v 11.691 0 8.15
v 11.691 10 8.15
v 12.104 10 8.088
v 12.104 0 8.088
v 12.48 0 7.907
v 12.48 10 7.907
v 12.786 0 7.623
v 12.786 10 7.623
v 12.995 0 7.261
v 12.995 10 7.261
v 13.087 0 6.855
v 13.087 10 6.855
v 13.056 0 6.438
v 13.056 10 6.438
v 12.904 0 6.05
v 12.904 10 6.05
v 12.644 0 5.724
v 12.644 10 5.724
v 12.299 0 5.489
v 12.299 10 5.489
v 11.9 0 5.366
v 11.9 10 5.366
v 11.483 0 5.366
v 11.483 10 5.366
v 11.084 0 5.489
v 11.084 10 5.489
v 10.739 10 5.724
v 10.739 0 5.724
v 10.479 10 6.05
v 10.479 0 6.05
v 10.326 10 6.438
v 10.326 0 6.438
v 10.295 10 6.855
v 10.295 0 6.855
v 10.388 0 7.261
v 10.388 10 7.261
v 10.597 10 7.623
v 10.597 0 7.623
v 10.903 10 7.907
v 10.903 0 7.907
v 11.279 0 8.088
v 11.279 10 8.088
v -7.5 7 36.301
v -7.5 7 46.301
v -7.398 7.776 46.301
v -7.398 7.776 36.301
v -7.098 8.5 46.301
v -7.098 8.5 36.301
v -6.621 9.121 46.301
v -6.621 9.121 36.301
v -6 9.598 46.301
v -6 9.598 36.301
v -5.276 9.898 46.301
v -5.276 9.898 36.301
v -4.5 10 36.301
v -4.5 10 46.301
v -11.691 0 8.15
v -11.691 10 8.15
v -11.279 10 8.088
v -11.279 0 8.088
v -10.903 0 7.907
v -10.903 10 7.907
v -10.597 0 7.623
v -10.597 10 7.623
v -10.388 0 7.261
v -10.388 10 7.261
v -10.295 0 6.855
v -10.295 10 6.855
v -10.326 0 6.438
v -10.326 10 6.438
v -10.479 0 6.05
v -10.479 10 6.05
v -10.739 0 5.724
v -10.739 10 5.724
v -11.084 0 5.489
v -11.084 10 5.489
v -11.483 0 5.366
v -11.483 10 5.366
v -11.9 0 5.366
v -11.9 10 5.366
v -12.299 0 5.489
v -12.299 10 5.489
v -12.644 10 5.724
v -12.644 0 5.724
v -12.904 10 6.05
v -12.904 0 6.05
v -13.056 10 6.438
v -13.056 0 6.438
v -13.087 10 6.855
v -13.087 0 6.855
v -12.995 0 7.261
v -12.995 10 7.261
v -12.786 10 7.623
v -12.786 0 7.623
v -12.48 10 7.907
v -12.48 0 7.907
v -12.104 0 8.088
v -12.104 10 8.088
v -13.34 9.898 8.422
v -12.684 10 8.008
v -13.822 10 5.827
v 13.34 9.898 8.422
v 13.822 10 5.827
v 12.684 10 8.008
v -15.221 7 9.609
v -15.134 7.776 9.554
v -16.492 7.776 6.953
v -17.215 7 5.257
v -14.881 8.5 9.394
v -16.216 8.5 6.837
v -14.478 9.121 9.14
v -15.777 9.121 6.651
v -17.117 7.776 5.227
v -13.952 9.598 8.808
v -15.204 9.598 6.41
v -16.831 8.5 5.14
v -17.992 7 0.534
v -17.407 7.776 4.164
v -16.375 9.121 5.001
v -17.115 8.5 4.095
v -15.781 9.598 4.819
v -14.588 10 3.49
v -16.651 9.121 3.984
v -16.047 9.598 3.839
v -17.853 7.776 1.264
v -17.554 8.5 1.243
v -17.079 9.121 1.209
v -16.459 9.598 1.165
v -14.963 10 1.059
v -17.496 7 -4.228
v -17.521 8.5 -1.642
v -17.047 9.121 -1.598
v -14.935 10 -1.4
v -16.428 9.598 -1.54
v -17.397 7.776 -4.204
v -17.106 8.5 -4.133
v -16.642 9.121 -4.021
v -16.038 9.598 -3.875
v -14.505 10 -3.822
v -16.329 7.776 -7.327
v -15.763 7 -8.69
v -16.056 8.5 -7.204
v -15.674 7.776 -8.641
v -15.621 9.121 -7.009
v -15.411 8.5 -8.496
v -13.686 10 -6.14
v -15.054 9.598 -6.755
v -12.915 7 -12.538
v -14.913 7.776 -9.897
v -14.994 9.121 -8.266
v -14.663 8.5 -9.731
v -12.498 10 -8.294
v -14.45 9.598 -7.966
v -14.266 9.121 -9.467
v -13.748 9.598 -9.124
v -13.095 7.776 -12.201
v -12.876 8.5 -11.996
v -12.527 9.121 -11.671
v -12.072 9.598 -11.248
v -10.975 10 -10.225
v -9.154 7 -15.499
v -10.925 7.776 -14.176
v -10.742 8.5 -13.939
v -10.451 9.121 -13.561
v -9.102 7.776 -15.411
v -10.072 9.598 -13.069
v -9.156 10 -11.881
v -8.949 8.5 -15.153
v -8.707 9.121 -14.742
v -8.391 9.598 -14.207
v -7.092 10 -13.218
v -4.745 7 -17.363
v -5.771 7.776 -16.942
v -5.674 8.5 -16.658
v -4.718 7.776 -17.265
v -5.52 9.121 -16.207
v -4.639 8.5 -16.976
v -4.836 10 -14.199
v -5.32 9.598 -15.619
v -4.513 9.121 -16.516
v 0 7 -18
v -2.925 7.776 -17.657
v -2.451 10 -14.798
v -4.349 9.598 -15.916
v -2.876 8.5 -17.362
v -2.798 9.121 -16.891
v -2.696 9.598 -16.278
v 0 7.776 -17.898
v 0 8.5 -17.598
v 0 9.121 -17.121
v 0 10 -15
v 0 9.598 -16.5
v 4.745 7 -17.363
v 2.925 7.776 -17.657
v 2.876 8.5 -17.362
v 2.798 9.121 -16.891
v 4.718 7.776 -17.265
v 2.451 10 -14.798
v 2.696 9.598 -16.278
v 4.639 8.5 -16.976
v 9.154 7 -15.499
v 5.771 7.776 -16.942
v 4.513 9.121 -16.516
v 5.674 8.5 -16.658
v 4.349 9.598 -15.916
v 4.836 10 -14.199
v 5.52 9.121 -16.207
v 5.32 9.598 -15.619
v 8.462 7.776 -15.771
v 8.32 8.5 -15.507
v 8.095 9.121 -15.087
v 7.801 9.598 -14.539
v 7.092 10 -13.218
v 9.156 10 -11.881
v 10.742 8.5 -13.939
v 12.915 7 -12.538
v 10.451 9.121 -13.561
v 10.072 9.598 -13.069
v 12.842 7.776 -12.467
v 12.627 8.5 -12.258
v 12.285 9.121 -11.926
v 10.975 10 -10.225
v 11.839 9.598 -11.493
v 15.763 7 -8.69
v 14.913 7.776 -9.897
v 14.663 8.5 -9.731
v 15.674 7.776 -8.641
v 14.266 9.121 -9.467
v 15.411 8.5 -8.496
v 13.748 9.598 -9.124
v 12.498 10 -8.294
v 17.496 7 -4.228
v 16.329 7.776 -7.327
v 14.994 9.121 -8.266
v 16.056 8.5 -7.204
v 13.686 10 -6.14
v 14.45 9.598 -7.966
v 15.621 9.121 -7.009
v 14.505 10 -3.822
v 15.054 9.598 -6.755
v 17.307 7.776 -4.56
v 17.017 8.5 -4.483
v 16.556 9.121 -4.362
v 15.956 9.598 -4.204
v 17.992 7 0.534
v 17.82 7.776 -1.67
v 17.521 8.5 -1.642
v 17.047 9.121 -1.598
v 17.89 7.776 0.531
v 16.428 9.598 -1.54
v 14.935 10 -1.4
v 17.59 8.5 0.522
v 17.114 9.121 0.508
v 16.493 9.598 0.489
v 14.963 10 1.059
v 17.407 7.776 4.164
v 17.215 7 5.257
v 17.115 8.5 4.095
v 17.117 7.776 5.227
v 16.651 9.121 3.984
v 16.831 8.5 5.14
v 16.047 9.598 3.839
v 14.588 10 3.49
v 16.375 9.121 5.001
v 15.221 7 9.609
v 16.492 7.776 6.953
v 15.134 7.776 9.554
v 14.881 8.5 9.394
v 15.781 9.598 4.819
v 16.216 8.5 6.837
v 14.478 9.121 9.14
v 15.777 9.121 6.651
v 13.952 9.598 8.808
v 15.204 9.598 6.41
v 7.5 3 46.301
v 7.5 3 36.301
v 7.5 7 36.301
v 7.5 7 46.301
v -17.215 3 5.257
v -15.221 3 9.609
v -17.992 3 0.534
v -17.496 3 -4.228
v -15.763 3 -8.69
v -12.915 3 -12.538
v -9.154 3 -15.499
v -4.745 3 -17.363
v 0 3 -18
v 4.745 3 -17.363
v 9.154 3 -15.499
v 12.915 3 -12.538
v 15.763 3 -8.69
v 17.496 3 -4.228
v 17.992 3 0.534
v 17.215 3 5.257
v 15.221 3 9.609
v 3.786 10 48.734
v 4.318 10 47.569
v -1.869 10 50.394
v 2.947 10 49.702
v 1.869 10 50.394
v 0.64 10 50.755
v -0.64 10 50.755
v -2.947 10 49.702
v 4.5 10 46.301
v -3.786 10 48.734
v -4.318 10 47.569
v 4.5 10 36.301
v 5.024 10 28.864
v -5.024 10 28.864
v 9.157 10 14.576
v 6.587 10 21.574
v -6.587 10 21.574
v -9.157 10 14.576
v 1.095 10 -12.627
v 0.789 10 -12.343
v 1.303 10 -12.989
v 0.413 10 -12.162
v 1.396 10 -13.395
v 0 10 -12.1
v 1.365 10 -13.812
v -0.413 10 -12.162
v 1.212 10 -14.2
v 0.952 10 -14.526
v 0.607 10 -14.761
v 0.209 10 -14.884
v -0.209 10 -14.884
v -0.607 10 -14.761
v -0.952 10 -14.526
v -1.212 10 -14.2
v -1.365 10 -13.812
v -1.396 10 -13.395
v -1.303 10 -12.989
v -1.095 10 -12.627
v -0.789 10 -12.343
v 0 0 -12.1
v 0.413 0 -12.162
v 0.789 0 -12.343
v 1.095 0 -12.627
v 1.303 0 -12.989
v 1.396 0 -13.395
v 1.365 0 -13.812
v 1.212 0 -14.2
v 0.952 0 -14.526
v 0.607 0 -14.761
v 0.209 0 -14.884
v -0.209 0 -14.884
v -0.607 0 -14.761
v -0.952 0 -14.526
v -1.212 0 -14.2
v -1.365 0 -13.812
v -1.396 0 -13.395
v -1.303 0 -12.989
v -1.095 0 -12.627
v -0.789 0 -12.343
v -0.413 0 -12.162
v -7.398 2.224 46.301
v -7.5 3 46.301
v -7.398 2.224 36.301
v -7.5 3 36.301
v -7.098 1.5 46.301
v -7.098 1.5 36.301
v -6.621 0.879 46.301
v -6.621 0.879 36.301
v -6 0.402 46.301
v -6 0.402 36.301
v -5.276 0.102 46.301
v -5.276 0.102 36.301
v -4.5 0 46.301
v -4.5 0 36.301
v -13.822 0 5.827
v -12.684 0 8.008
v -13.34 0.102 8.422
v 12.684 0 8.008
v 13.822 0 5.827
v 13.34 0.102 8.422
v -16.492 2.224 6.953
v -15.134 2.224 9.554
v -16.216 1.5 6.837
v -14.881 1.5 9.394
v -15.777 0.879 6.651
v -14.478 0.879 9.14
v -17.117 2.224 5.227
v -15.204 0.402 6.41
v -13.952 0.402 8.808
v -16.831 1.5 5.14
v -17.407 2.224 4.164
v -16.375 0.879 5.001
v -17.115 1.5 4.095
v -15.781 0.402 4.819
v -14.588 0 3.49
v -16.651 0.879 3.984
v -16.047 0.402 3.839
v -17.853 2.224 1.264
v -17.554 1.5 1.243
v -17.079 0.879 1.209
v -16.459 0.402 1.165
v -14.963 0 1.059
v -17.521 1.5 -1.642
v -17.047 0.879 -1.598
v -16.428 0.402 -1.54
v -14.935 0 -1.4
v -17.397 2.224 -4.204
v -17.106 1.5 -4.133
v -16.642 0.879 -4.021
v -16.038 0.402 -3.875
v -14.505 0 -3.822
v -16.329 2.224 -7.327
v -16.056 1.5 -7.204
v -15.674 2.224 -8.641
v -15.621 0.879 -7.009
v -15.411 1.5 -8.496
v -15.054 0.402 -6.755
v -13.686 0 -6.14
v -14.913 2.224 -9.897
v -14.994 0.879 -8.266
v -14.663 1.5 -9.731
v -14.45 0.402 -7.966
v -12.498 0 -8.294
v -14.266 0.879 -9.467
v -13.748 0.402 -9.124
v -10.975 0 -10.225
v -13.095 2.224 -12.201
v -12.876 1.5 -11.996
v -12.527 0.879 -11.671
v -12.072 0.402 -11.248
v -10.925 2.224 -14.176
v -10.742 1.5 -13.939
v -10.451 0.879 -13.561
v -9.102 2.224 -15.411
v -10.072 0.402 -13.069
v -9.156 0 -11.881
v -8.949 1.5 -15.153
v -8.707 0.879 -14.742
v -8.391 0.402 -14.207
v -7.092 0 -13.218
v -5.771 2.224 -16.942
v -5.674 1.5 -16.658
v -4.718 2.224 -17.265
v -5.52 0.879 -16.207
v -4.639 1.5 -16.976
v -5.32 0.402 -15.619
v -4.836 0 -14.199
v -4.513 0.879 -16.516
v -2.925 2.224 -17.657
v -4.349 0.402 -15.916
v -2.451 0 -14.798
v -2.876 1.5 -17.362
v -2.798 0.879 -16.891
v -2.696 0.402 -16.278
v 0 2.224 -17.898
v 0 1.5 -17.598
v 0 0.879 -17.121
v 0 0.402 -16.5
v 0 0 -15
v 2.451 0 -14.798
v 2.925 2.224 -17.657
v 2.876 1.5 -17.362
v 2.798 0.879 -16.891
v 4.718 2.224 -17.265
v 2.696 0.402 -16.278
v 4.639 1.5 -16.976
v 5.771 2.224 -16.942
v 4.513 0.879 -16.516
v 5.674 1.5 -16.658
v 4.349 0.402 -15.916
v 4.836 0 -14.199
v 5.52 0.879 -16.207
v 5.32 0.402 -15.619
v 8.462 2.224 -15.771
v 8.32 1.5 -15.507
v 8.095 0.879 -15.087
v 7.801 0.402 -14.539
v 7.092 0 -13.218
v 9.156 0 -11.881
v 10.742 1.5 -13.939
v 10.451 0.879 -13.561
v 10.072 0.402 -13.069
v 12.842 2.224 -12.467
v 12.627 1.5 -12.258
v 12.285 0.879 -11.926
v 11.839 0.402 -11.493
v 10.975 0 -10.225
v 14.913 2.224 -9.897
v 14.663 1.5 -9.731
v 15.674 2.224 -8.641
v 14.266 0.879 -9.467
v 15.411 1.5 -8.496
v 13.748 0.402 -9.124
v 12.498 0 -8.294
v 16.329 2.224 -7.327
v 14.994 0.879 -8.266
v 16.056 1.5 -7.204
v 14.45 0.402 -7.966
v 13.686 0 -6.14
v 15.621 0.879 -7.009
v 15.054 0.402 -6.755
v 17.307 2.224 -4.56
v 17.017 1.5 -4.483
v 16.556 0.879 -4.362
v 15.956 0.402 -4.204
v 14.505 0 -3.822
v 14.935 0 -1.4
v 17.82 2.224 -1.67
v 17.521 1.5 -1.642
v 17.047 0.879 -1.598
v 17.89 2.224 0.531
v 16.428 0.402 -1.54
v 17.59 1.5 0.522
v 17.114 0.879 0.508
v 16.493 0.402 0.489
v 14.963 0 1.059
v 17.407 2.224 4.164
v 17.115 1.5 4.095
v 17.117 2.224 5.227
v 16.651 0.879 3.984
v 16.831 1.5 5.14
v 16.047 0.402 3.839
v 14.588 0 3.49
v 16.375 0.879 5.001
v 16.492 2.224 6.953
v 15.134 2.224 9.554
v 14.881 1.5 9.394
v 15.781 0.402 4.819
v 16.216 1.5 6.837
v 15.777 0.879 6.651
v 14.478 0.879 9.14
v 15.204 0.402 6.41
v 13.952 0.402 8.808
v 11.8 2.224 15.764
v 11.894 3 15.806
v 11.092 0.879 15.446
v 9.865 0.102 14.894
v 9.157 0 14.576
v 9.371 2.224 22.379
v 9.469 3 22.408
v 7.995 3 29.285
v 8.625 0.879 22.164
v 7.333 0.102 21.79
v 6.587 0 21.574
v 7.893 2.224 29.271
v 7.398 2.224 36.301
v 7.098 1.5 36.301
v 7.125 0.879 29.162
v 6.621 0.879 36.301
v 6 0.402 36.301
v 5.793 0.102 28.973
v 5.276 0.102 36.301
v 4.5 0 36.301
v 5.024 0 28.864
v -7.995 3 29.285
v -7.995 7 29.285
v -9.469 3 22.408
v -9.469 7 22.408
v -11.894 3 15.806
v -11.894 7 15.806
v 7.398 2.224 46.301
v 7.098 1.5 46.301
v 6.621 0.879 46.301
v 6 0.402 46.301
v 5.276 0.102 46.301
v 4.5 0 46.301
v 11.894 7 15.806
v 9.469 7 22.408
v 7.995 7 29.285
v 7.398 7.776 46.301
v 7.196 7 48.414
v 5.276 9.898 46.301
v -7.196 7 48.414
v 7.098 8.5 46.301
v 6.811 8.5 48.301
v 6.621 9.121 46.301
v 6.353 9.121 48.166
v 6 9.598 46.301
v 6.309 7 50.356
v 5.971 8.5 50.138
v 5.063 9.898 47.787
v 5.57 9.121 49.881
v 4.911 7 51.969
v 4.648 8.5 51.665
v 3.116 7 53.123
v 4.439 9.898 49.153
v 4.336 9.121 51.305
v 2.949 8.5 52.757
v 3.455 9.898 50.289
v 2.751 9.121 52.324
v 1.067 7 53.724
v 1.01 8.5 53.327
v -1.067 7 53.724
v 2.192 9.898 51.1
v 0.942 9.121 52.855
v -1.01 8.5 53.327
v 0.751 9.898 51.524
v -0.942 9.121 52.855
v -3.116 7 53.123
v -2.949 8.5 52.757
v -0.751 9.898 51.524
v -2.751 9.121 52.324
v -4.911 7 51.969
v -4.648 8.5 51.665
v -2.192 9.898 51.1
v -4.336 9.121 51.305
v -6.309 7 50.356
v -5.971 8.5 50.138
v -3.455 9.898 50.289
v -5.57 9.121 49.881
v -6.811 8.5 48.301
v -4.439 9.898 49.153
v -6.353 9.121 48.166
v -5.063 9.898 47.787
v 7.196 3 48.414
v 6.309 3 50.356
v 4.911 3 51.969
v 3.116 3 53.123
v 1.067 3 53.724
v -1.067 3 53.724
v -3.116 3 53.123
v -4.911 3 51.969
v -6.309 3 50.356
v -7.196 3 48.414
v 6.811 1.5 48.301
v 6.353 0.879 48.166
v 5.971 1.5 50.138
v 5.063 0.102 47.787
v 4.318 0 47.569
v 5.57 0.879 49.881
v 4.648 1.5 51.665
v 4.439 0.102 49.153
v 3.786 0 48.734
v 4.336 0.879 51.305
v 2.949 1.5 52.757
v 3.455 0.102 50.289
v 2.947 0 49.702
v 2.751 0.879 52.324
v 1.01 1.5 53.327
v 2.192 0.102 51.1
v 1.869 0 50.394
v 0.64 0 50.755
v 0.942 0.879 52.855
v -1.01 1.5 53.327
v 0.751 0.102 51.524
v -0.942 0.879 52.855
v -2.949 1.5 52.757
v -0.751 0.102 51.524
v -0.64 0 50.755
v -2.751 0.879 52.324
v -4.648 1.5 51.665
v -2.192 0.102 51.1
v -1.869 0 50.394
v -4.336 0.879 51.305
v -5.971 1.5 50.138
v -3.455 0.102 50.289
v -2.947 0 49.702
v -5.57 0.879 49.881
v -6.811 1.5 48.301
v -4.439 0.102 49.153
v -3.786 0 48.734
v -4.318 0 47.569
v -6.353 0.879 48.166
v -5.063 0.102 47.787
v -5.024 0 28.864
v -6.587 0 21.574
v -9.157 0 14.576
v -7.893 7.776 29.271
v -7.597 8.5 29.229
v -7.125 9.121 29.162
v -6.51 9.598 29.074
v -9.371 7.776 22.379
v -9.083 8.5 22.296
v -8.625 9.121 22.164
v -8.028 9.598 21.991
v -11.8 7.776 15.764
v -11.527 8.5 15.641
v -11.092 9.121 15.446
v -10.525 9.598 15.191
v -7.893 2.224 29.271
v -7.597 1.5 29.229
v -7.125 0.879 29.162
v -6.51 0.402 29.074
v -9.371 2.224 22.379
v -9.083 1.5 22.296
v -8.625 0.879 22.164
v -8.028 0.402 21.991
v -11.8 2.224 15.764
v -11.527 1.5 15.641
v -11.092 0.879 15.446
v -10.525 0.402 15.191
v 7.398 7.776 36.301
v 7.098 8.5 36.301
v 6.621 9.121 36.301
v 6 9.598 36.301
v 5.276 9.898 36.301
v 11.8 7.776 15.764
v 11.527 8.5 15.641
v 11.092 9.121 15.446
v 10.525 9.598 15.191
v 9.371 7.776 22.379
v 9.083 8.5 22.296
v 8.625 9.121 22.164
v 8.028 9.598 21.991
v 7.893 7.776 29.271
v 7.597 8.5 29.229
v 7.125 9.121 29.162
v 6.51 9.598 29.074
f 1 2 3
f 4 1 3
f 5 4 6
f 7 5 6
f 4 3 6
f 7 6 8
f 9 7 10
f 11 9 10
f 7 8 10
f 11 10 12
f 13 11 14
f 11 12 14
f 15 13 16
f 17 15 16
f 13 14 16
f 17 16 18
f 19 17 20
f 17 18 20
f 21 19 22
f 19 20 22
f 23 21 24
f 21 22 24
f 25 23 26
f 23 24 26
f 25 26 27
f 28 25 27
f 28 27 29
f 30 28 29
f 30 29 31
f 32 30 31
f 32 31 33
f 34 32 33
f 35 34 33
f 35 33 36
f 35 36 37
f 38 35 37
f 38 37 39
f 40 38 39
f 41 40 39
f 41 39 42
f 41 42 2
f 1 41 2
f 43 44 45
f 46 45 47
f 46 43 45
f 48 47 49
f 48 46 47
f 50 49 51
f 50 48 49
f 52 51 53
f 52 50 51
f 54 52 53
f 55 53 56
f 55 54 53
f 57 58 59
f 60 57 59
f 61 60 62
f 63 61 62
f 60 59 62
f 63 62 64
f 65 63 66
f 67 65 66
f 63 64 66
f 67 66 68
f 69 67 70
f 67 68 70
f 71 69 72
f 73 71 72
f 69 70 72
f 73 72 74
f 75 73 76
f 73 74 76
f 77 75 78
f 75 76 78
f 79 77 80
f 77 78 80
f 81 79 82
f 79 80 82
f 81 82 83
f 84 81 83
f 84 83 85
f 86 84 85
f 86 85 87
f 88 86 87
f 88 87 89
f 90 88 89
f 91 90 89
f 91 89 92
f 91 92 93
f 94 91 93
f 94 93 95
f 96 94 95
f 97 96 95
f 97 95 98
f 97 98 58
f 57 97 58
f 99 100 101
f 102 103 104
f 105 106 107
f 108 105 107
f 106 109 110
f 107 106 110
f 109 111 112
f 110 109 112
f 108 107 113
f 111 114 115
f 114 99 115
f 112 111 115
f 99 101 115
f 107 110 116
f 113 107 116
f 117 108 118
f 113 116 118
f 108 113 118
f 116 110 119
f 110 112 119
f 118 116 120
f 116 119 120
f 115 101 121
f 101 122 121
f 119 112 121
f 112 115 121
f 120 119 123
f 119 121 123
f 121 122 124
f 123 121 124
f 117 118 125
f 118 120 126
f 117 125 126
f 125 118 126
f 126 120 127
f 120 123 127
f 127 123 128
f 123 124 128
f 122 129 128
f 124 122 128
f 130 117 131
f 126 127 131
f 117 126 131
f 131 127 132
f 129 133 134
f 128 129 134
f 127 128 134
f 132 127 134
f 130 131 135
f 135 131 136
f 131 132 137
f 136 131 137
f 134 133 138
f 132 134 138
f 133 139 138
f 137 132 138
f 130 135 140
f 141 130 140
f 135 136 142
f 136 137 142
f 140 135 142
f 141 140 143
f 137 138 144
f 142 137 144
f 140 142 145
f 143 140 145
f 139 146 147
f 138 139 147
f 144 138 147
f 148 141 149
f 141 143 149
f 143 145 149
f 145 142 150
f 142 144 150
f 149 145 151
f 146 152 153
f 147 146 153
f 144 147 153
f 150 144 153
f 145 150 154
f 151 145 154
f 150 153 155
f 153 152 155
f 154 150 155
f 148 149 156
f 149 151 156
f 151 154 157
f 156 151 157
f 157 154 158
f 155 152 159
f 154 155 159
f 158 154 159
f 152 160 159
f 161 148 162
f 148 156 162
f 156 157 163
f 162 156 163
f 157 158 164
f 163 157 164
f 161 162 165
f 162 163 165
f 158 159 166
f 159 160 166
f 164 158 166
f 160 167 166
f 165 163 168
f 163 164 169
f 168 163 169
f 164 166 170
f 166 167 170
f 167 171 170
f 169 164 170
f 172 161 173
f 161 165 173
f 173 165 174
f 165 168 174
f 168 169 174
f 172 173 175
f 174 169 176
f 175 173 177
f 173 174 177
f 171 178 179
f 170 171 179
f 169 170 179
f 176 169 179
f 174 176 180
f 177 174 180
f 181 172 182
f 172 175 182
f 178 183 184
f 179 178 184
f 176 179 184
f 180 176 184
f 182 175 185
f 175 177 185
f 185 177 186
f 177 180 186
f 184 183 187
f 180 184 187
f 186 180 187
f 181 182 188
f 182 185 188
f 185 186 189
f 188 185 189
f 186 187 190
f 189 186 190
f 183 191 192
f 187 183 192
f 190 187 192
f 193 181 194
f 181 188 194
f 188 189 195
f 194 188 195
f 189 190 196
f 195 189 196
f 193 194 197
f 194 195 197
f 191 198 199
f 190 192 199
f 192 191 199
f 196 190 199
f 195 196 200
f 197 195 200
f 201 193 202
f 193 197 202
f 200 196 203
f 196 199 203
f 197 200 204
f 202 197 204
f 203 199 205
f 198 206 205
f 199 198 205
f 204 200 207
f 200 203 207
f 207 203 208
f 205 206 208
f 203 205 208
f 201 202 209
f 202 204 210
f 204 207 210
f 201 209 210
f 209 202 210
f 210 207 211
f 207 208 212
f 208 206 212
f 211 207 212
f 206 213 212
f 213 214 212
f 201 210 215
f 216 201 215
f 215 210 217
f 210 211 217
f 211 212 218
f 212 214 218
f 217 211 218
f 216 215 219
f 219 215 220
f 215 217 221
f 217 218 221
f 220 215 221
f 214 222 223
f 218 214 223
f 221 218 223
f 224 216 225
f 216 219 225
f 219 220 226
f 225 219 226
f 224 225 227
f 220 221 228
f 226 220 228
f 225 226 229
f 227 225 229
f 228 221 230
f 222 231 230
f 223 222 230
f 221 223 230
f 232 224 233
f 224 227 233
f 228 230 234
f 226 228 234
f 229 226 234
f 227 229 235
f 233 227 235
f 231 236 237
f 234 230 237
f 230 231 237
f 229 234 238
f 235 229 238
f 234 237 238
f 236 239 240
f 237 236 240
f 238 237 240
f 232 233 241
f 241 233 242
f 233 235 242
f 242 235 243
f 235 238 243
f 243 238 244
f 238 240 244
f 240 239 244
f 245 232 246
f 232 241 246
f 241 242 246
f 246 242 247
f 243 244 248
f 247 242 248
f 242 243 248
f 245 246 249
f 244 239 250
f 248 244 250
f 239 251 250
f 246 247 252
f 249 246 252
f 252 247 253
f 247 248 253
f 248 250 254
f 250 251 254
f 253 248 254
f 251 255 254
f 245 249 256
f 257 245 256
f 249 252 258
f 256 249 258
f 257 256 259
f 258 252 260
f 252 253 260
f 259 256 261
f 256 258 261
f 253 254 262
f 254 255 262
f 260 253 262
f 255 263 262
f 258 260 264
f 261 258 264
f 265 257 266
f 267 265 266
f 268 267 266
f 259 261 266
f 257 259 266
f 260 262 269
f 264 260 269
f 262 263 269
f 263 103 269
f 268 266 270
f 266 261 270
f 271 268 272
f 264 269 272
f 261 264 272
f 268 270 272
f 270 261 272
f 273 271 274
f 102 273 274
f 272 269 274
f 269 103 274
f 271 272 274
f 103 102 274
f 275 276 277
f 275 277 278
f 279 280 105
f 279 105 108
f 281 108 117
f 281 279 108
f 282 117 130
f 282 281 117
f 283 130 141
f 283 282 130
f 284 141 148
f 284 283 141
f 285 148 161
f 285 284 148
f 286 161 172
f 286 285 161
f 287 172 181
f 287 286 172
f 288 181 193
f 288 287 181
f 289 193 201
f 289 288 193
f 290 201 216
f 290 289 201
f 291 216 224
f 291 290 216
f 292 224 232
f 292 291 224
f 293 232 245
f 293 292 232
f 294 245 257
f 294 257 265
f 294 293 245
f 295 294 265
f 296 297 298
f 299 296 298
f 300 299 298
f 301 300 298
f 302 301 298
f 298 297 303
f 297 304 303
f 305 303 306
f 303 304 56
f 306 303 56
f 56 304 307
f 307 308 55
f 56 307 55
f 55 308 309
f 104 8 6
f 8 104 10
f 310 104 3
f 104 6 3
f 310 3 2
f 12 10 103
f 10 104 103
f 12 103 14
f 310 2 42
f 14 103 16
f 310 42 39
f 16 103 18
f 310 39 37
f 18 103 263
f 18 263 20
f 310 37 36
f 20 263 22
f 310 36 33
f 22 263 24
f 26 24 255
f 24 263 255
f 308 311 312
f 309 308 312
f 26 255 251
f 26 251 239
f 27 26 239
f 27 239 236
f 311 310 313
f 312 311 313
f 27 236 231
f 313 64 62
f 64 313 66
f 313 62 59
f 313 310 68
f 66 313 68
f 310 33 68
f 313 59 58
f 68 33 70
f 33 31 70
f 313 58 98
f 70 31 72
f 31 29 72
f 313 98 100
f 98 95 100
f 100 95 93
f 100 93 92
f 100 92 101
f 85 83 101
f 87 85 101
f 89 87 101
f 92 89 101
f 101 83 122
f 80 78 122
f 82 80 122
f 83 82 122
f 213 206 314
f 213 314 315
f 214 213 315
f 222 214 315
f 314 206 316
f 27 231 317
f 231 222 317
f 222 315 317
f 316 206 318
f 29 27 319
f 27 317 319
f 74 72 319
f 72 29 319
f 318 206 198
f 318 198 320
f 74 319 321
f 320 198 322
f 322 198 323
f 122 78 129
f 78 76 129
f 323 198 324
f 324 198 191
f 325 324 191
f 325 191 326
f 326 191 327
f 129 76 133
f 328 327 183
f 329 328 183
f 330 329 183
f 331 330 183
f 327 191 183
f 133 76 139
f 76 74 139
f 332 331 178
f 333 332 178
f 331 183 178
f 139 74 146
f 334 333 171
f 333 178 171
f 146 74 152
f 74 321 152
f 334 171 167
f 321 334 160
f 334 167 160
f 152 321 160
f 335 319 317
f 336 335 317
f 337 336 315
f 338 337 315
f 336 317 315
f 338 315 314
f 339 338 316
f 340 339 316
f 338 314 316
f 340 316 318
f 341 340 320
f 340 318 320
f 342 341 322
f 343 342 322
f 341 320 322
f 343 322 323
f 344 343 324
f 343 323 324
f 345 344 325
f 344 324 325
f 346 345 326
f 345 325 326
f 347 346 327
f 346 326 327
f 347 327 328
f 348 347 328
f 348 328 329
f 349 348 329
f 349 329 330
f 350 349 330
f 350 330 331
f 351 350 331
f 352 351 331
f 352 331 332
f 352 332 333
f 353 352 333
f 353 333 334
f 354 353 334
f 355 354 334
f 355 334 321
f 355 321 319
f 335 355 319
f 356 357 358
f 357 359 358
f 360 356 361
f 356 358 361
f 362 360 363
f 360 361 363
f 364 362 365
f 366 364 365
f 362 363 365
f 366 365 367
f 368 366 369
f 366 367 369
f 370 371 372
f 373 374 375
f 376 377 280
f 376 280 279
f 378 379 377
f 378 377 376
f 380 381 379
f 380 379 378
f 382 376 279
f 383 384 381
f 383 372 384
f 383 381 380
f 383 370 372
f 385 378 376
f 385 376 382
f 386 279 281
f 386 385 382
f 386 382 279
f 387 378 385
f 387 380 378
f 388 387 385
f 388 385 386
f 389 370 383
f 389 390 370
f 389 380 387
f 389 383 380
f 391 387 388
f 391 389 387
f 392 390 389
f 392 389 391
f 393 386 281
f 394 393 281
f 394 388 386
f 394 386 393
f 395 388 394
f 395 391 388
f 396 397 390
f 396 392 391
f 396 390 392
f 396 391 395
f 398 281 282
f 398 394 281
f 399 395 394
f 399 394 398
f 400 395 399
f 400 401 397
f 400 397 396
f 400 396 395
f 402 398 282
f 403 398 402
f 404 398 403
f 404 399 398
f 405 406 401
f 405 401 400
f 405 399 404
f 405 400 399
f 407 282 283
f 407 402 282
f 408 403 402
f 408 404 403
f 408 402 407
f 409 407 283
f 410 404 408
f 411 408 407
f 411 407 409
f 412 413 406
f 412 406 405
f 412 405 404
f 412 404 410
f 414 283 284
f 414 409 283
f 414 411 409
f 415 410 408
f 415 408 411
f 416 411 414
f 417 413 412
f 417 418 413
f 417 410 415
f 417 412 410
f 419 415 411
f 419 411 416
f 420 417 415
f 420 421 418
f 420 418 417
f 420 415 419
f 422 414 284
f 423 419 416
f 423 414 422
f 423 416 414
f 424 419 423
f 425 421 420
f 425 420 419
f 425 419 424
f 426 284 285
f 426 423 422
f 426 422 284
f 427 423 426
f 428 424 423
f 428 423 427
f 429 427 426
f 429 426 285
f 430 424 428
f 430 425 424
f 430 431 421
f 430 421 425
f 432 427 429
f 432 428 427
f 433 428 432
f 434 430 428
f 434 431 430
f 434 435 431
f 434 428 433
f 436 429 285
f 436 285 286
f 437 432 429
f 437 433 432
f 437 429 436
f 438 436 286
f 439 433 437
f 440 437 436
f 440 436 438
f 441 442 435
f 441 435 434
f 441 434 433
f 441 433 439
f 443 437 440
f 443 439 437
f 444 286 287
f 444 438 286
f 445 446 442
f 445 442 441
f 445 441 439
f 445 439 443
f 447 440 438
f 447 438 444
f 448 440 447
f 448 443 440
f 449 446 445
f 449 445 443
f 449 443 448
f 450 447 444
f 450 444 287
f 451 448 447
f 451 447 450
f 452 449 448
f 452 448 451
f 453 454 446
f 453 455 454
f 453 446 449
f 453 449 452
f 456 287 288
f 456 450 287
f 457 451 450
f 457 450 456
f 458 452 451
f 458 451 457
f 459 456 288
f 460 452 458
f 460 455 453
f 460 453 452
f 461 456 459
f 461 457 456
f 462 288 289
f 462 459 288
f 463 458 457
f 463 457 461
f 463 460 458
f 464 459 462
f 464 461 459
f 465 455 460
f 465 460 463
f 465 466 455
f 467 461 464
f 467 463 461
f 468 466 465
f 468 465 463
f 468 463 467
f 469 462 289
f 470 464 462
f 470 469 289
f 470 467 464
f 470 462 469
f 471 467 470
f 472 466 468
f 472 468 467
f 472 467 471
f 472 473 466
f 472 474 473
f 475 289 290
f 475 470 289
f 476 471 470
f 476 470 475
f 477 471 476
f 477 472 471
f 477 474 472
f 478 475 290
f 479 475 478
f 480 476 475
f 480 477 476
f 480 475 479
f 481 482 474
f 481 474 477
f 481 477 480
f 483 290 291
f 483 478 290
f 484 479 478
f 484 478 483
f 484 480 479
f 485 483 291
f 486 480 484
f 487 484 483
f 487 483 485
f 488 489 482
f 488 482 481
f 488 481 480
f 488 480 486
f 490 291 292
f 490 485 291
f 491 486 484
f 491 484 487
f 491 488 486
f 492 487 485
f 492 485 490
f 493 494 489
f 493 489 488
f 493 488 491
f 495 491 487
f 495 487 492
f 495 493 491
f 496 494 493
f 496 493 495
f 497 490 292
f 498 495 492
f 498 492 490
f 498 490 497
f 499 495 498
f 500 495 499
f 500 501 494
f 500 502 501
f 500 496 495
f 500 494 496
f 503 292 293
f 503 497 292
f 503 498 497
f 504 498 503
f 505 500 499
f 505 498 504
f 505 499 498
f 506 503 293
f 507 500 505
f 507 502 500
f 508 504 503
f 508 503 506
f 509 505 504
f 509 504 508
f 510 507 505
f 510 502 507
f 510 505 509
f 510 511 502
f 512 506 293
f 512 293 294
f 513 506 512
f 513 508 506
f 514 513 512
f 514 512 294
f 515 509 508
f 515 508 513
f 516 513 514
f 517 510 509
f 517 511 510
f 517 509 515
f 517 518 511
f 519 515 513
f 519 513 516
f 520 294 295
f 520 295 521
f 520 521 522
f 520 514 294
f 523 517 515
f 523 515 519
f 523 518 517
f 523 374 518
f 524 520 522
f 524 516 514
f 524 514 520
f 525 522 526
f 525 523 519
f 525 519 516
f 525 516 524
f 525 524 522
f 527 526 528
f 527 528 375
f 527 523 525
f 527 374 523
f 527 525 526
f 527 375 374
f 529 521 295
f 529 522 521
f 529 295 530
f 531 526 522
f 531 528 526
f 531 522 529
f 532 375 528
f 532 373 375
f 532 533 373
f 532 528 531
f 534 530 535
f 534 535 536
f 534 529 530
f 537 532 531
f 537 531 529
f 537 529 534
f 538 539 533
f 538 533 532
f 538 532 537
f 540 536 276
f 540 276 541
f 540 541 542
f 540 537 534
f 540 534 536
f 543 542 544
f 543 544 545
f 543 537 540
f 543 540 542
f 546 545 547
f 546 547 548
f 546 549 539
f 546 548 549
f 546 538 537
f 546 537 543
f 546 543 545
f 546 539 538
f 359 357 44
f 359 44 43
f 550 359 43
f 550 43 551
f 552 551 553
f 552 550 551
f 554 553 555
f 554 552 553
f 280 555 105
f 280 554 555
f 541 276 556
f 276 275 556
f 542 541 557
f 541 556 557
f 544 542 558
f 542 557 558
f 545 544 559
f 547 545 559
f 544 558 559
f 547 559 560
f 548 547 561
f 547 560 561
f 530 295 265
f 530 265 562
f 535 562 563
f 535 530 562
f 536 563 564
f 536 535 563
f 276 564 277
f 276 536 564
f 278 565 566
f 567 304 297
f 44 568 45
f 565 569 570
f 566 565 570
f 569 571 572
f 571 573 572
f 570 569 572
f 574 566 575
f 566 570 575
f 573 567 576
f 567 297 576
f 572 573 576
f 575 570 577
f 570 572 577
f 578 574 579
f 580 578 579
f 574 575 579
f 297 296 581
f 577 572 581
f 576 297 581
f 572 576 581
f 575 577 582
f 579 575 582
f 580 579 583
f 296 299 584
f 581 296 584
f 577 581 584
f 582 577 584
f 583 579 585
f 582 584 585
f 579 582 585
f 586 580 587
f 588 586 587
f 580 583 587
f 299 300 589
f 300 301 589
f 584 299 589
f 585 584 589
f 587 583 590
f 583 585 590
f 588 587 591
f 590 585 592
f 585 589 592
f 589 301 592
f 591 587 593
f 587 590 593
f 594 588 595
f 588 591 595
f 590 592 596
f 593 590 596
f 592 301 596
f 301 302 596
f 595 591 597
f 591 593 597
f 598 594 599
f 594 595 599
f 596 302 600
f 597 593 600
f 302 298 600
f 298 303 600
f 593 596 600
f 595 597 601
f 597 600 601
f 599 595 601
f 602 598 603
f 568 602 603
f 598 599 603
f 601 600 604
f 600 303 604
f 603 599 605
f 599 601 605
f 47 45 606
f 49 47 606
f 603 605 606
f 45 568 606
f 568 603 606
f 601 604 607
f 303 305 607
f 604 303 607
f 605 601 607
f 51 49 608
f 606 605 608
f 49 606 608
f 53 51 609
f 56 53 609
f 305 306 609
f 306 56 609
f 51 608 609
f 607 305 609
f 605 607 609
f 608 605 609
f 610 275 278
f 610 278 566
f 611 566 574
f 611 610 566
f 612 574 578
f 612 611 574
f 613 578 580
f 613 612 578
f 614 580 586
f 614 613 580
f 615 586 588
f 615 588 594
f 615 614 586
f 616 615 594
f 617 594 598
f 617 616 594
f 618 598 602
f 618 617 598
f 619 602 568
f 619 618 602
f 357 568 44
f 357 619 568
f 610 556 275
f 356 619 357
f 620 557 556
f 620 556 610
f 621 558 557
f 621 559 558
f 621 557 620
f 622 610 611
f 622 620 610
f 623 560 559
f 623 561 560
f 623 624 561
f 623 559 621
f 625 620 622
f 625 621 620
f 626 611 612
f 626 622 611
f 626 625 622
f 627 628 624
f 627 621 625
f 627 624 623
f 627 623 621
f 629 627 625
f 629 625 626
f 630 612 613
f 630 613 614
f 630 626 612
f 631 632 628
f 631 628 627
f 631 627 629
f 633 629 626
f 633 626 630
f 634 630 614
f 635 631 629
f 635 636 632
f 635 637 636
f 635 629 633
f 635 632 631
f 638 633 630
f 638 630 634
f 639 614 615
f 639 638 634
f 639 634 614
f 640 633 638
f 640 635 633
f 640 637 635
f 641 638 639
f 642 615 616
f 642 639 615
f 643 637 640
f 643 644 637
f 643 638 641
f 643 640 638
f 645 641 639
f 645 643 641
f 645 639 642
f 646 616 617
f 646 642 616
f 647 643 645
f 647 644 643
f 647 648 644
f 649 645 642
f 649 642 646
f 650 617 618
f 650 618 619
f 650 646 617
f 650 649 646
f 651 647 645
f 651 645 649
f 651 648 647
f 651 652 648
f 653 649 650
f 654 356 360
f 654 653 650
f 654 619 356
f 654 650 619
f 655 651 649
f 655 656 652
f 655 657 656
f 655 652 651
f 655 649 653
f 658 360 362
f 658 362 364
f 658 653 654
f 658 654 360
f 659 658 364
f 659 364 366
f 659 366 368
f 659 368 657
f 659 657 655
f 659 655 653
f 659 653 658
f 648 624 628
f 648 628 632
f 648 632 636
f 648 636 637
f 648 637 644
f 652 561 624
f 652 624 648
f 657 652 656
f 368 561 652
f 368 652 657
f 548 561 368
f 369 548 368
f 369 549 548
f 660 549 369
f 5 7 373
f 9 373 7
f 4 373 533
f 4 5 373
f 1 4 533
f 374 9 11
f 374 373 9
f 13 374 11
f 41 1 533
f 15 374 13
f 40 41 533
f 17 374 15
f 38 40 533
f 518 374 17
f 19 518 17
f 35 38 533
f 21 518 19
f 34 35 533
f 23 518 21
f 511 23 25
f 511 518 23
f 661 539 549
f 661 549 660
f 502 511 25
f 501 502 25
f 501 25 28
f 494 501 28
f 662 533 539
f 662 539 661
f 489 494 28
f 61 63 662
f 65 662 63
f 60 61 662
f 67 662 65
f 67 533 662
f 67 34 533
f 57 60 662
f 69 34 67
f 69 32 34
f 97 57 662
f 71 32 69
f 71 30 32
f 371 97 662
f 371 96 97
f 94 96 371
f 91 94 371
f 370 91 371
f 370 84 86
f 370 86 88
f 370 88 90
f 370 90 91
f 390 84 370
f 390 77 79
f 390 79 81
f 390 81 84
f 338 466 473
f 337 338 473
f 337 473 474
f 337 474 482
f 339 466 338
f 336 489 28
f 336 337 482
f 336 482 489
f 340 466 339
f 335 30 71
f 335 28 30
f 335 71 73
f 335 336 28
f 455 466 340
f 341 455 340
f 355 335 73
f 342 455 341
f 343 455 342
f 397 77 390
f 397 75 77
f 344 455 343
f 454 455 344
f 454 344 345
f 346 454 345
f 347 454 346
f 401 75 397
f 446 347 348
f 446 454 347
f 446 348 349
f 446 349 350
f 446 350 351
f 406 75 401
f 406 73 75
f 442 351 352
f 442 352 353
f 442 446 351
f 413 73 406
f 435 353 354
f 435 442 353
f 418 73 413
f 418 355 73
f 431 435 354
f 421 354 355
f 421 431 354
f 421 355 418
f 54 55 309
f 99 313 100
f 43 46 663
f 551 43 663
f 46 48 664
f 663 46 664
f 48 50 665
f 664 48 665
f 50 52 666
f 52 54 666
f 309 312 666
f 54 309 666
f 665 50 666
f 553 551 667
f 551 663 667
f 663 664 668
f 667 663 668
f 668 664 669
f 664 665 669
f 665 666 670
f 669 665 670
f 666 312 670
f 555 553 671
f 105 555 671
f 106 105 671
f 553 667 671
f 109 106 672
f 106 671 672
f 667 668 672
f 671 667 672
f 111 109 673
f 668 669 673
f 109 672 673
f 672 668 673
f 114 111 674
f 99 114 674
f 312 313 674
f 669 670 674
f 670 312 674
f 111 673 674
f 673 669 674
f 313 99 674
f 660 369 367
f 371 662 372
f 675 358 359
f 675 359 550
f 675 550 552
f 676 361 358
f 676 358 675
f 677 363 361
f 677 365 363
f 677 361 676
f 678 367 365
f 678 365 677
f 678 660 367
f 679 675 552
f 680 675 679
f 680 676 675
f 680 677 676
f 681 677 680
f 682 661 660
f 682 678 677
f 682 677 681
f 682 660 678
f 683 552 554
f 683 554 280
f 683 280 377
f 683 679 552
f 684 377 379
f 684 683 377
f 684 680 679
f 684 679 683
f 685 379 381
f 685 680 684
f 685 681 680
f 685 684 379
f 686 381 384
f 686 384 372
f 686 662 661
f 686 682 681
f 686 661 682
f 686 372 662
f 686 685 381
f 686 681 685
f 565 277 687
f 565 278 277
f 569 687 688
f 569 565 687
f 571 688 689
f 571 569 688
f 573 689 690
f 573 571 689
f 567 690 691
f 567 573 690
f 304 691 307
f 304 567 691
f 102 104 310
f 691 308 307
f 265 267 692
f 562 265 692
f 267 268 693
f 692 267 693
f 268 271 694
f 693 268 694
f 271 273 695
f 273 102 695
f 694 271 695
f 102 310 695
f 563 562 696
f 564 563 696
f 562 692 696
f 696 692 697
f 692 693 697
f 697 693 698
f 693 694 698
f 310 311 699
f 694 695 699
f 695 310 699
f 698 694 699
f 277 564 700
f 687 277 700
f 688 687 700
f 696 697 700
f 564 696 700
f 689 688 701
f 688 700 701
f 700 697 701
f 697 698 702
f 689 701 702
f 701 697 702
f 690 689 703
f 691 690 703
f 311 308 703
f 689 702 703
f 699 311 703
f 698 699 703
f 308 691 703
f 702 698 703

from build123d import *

# Parameters (mm, degrees)
BOSS_EXTRUDE1_DEPTH = 10
FILLET1_R           = 3
SKETCH2_R           = 1.4
CUT_EXTRUDE1_DEPTH  = 58.606674312


with BuildPart() as part:
    # Sketch1 → Boss-Extrude1 (new body)
    with BuildSketch(Plane(origin=(0, 0, 0), x_dir=(1, 0, 0), z_dir=(0, 1, 0))):
        with BuildLine():
            Line((7.5, -36.300826437), (7.5, -46.300826437))
            ThreePointArc((7.5, -46.300826437), (0, -53.800826437), (-7.5, -46.300826437))
            Line((-7.5, -46.300826437), (-7.5, -36.300826437))
            ThreePointArc((-7.5, -36.300826437), (-9.468913253, -22.407853181), (-15.220588235, -9.609042292))
            ThreePointArc((-15.220588235, -9.609042292), (0, 18), (15.220588235, -9.609042292))
            ThreePointArc((15.220588235, -9.609042292), (9.468913253, -22.407853181), (7.5, -36.300826437))
        make_face()
    extrude(amount=BOSS_EXTRUDE1_DEPTH)

    # Fillet1
    fillet1_edges = [part.edges().sort_by_distance(p)[0] for p in [
        (-9.468913253, 10, 22.407853181),
        (-7.5, 10, 41.300826437),
        (0, 10, 53.800826437),
        (7.5, 10, 41.300826437),
        (9.468913253, 10, 22.407853181),
        (7.5, 0, 41.300826437),
        (0, 0, 53.800826437),
        (-7.5, 0, 41.300826437),
        (-9.468913253, 0, 22.407853181),
        (0, 0, -18),
        (9.468913253, 0, 22.407853181),
        (0, 10, -18),
    ]]
    fillet(fillet1_edges, radius=FILLET1_R)

    # Sketch2 → Cut-Extrude1 (cut, through all)
    with BuildSketch(Plane(origin=(0, 10, 0), x_dir=(1, 0, 0), z_dir=(0, 1, 0))):
        with Locations(Location((0, 13.5, 0), (0, 0, 270))):
            Circle(SKETCH2_R)
        with Locations(Location((-11.691342951, -6.75, 0), (0, 0, 270))):
            Circle(SKETCH2_R)
        with Locations(Location((11.691342951, -6.75, 0), (0, 0, 270))):
            Circle(SKETCH2_R)
    extrude(amount=-CUT_EXTRUDE1_DEPTH, mode=Mode.SUBTRACT)


solid = part.part
